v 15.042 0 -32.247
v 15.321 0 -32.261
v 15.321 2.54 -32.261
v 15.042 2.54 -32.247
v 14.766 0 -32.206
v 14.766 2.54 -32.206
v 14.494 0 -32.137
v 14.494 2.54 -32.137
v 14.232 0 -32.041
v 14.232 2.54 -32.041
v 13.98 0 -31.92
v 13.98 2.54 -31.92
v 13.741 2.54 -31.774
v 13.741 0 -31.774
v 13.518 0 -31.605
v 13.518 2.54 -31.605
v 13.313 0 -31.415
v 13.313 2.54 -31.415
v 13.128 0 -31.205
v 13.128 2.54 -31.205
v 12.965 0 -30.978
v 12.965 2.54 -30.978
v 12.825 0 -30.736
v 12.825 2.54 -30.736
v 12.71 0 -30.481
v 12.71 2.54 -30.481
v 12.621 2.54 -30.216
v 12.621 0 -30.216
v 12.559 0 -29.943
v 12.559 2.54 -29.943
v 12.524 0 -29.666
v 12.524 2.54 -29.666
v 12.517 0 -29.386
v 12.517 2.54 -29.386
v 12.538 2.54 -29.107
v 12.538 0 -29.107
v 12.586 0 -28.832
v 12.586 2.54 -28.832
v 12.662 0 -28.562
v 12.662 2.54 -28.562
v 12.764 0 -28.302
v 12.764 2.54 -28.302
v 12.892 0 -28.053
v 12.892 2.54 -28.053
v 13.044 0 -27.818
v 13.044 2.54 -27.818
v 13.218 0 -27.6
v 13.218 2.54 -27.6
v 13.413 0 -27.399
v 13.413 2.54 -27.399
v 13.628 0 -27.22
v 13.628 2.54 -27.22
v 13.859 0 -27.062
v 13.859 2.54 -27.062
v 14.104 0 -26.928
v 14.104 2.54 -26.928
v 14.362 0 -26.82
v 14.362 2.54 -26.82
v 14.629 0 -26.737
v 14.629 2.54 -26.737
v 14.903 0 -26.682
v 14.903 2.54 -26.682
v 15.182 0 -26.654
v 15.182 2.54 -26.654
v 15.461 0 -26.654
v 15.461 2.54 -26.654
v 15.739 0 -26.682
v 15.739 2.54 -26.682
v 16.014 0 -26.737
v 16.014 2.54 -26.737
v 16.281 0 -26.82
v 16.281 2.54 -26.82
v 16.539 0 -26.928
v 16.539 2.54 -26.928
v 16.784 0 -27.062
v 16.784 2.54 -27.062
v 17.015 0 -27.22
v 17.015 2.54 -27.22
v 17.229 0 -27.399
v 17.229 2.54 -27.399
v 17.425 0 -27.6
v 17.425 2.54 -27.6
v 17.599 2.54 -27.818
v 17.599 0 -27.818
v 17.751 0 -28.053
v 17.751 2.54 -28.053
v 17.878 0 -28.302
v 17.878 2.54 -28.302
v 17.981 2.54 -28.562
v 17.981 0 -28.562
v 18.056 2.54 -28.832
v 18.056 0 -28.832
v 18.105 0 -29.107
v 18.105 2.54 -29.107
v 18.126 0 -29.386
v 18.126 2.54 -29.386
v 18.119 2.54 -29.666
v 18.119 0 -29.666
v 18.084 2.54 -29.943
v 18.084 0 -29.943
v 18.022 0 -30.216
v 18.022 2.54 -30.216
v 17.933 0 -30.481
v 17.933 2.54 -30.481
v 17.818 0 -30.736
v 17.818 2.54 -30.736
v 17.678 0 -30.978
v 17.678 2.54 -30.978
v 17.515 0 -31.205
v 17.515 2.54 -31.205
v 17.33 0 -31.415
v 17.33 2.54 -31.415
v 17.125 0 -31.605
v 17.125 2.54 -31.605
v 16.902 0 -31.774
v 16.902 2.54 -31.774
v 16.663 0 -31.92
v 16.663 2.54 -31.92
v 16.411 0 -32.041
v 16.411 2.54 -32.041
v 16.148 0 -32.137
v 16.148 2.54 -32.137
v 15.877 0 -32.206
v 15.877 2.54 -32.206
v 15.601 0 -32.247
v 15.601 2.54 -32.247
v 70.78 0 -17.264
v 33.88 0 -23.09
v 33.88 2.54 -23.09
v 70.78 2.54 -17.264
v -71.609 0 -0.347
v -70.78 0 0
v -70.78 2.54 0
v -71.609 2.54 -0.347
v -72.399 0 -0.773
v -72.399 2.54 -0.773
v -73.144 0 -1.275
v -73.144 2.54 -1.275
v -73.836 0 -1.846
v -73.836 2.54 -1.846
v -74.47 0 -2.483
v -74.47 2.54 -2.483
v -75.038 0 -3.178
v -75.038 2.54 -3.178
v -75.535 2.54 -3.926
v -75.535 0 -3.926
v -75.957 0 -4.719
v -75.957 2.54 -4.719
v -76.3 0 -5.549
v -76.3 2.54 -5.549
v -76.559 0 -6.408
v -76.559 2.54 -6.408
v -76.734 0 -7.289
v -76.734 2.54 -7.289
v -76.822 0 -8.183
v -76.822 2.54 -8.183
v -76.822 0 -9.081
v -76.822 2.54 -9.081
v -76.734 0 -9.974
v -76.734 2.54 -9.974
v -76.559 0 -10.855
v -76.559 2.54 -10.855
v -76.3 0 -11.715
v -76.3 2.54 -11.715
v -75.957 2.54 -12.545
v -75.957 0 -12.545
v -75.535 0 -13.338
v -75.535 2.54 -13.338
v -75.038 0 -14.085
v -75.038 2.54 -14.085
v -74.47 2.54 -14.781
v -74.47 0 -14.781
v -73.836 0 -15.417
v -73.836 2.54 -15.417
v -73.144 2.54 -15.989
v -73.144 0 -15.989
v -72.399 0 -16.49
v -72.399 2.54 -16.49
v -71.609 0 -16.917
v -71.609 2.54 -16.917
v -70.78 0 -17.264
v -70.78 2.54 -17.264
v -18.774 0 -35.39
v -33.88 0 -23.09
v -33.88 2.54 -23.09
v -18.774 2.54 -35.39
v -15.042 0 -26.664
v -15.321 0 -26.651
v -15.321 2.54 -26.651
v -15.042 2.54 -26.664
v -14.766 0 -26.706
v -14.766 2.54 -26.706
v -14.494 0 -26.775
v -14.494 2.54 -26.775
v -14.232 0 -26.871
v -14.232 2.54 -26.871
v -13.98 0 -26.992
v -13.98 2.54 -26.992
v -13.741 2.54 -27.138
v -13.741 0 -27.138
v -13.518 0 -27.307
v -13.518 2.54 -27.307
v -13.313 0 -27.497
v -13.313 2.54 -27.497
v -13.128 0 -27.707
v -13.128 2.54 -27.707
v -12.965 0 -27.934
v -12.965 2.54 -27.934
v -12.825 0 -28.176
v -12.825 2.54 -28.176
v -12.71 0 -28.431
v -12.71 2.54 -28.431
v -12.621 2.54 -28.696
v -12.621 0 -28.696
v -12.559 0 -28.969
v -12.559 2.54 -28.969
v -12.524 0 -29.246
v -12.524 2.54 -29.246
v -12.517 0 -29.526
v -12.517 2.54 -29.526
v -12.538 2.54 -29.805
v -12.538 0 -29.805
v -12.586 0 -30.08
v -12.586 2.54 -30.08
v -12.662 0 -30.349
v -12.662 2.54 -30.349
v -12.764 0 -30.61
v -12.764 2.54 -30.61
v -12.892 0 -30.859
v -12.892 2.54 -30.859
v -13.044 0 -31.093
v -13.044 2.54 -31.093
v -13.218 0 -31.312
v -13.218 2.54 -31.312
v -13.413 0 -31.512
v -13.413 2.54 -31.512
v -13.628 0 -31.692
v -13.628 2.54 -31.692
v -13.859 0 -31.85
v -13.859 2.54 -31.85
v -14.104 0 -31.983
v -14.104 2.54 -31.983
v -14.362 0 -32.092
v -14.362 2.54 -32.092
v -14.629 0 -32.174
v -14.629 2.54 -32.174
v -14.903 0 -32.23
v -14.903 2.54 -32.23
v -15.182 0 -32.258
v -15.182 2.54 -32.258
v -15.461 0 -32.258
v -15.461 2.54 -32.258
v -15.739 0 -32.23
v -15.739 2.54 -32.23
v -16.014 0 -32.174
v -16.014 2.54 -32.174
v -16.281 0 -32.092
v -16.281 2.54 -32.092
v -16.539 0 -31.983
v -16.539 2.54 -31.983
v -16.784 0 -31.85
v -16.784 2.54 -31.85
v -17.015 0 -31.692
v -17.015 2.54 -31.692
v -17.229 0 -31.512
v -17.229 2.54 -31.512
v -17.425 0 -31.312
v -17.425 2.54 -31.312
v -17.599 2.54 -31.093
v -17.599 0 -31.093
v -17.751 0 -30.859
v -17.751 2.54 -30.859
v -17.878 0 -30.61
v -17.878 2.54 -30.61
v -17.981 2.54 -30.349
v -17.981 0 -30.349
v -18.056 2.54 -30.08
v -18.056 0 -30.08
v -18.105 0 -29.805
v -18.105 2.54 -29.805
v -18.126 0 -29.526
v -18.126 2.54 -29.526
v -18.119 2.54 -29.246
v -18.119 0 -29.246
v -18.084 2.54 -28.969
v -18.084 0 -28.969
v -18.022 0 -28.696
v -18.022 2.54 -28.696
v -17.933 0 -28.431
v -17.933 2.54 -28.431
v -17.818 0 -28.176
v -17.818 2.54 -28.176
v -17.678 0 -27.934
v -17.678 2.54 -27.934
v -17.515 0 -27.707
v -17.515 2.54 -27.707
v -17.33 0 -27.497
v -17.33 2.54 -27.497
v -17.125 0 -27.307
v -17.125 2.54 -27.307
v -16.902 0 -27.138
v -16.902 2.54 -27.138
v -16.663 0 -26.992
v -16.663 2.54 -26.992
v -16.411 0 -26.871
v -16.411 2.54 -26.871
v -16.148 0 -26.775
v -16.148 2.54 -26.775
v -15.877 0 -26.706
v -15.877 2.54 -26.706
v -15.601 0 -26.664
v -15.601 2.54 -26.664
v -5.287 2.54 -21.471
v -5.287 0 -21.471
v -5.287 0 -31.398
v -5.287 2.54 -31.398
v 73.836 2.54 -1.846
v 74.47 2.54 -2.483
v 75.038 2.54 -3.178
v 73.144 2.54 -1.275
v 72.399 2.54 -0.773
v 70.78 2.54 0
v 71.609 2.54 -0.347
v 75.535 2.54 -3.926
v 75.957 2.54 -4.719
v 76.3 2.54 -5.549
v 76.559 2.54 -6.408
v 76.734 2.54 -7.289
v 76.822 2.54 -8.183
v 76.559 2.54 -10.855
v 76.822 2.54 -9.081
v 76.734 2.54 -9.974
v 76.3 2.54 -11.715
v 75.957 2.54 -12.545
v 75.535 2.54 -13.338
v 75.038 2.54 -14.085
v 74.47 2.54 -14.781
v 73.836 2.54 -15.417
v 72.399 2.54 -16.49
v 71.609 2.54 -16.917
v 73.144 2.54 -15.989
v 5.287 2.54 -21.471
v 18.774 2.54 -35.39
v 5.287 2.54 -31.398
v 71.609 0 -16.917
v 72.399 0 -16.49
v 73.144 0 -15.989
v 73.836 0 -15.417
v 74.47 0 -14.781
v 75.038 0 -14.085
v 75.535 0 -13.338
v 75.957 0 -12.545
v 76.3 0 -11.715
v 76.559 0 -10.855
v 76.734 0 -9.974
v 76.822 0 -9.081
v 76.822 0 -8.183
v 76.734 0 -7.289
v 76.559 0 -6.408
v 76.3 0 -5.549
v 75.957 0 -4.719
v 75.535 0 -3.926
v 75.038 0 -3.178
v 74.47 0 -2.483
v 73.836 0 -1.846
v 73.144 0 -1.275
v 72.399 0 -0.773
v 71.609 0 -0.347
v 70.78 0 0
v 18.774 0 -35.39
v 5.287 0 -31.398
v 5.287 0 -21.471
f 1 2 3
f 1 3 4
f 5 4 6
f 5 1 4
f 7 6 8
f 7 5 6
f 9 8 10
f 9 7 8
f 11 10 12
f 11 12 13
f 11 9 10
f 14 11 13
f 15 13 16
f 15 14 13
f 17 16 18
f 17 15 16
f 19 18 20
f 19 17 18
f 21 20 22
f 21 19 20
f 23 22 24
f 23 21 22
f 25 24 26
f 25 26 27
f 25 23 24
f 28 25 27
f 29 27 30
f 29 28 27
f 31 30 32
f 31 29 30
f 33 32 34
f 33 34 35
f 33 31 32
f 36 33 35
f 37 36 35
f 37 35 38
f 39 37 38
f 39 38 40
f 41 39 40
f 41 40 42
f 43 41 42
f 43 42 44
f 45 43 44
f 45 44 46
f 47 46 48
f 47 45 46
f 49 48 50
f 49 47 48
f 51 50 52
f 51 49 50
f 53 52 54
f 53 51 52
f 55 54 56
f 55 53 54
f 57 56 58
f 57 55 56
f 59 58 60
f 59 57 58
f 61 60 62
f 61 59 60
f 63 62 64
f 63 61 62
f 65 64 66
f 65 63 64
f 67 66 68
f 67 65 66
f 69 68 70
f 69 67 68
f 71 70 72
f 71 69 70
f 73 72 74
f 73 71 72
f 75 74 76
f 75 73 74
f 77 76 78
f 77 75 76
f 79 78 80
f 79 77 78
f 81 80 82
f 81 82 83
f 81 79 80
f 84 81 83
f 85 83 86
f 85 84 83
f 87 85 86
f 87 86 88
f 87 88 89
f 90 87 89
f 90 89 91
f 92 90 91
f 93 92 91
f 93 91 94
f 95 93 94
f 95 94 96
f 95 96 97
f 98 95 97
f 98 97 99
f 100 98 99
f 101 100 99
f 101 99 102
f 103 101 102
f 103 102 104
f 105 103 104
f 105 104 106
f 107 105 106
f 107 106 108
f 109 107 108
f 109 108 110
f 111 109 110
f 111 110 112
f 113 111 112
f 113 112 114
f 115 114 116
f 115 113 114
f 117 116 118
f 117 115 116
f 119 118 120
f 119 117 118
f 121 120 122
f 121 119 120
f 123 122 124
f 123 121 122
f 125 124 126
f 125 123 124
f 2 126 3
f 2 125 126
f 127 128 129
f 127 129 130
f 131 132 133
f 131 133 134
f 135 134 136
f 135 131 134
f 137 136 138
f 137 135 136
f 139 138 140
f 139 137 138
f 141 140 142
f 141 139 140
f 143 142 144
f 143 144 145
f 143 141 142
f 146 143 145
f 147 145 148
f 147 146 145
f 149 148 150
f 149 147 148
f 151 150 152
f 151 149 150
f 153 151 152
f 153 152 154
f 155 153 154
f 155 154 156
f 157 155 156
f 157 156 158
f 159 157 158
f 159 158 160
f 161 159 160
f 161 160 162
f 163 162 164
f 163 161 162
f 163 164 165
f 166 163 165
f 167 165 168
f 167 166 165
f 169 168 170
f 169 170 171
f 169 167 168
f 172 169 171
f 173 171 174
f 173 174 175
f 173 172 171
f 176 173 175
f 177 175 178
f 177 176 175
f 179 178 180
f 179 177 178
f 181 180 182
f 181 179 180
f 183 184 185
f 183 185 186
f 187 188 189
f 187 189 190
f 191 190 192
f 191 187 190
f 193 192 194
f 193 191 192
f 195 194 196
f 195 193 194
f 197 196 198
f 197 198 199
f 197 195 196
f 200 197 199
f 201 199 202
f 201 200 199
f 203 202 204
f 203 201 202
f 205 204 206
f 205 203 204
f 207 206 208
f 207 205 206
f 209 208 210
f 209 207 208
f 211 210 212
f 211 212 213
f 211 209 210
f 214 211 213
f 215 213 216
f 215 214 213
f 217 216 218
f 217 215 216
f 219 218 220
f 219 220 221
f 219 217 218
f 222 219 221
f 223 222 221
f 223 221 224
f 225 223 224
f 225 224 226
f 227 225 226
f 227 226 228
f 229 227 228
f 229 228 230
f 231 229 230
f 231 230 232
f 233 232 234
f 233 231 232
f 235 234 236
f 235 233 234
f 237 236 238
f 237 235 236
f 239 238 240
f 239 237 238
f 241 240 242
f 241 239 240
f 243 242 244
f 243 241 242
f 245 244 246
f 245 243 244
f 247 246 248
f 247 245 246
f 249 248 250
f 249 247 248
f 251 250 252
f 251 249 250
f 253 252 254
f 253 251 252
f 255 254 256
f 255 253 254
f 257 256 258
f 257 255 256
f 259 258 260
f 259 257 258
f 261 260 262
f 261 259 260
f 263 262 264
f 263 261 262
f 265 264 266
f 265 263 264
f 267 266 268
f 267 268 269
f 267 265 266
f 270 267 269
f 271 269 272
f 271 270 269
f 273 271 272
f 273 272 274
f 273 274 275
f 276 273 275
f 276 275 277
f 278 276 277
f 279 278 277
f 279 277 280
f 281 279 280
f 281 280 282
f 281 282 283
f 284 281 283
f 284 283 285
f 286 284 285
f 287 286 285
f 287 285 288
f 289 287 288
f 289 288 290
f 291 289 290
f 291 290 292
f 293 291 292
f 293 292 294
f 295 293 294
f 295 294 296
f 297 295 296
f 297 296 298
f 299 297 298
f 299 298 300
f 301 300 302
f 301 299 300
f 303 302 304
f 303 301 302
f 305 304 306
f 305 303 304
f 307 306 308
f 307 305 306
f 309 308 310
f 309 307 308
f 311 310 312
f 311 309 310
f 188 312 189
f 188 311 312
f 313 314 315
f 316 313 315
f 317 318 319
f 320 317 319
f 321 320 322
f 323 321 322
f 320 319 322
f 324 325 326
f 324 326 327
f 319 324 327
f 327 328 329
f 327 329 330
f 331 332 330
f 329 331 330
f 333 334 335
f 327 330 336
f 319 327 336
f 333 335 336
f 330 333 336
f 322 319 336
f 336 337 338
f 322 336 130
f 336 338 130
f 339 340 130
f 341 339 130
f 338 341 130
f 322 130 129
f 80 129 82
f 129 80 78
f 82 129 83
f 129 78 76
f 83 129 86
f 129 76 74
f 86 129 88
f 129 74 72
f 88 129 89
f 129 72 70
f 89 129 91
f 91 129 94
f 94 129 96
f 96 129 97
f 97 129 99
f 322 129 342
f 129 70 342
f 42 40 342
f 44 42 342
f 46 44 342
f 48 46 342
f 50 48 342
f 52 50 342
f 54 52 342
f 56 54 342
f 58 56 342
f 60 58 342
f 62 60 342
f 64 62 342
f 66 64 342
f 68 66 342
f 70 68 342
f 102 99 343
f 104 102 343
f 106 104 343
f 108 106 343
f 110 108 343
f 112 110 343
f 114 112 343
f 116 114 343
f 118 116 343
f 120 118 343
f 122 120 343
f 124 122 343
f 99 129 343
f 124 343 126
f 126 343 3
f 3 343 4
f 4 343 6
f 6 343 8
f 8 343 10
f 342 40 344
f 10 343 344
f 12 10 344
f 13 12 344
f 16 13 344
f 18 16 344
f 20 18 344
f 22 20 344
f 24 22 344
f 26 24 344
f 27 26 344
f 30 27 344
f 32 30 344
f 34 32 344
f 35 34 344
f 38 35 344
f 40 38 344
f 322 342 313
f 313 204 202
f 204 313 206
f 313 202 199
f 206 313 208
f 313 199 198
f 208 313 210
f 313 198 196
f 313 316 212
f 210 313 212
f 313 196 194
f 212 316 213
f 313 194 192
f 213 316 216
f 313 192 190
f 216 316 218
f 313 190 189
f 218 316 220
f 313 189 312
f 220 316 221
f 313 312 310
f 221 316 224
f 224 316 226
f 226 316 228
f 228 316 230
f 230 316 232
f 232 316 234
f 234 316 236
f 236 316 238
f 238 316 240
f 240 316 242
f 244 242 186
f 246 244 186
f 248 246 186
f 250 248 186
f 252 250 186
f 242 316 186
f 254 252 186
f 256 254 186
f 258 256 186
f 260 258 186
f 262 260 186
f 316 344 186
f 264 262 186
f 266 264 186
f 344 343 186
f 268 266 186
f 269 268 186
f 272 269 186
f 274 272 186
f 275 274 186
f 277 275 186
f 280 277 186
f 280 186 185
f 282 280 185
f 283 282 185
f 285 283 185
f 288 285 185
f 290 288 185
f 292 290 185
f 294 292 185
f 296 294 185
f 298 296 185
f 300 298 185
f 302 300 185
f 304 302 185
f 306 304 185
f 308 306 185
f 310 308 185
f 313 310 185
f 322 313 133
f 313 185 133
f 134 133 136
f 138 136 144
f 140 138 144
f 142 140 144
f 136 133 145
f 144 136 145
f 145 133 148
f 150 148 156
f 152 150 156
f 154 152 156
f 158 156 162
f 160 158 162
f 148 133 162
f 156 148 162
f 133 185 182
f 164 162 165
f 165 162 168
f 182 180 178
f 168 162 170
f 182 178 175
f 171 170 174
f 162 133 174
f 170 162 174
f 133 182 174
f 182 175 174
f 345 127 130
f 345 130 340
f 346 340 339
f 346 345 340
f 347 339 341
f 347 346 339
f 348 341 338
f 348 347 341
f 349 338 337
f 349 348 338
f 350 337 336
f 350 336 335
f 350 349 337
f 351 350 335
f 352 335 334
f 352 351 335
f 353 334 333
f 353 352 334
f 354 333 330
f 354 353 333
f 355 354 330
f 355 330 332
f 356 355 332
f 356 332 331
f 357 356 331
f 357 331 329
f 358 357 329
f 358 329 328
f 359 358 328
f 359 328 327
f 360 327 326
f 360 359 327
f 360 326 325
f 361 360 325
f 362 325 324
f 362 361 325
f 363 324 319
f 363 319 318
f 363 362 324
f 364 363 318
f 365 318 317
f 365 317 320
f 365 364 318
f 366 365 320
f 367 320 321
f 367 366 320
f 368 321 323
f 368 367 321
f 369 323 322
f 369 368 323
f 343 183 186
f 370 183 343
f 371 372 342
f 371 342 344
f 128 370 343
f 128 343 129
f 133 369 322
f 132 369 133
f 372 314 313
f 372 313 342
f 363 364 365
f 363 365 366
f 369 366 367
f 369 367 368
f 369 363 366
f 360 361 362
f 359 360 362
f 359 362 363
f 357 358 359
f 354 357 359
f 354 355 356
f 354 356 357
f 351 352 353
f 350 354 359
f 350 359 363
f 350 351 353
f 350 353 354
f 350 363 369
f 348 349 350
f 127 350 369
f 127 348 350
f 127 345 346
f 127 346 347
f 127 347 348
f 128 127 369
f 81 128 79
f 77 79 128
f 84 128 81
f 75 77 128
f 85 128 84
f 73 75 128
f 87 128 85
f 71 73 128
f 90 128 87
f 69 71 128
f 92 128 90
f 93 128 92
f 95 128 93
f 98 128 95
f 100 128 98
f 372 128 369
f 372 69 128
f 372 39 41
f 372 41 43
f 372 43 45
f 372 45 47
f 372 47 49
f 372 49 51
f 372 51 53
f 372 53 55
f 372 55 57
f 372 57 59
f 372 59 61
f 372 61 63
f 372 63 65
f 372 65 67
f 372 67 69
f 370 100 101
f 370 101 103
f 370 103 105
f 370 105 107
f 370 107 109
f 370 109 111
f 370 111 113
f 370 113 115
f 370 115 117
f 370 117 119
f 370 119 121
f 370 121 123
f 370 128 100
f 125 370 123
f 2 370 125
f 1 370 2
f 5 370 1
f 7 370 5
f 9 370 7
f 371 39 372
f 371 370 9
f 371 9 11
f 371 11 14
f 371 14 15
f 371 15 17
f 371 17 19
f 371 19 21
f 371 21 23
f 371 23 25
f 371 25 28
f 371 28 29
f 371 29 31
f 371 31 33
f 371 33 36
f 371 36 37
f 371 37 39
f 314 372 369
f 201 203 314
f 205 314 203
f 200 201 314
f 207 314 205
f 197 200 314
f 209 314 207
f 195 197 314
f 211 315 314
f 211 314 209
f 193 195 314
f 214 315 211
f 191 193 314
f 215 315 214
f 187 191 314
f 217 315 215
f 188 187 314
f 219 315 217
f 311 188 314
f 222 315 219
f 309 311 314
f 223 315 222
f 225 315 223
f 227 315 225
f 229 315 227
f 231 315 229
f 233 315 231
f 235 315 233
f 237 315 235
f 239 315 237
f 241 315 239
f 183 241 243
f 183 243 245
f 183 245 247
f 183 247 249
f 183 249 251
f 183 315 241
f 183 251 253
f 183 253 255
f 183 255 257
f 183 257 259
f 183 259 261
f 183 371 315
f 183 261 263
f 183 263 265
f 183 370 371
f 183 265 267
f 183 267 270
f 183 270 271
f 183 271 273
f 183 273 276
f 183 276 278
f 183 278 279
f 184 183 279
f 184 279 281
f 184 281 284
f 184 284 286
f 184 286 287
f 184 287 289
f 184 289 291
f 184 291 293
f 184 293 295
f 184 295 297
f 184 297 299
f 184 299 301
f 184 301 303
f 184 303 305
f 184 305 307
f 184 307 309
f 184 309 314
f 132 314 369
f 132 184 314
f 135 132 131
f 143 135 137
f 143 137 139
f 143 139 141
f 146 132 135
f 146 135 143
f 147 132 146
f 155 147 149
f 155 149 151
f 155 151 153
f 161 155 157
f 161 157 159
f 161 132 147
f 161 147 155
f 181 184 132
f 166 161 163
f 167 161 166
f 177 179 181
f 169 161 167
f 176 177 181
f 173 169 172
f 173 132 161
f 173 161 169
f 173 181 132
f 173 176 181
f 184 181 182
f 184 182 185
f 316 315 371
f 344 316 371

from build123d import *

# Parameters (mm, degrees)
SKETCH1_R           = 2.805320717
SKETCH1_W           = 10.573901166
SKETCH1_H           = 9.926519461
BOSS_EXTRUDE1_DEPTH = 2.54


with BuildPart() as part:
    # Sketch1 → Boss-Extrude1 (new body)
    with BuildSketch(Plane(origin=(0, 0, 0), x_dir=(1, 0, 0), z_dir=(0, 1, 0))):
        with BuildLine():
            Line((70.780399637, 0), (-70.780399637, 0))
            ThreePointArc((-70.780399637, 0), (-76.832778265, 8.631756053), (-70.780399637, 17.263512107))
            Line((-70.780399637, 17.263512107), (-33.879642509, 23.089947443))
            Line((-33.879642509, 23.089947443), (-18.774069416, 35.390199818))
            Line((-18.774069416, 35.390199818), (18.774069416, 35.390199818))
            Line((18.774069416, 35.390199818), (33.879642509, 23.089947443))
            Line((33.879642509, 23.089947443), (70.780399637, 17.263512107))
            ThreePointArc((70.780399637, 17.263512107), (76.832778265, 8.631756053), (70.780399637, 0))
        make_face()
        with Locations(Location((-15.321366995, 29.455867532, 0), (0, 0, 270))):
            Circle(SKETCH1_R, mode=Mode.SUBTRACT)
        with Locations(Location((15.321366995, 29.455867532, 0), (0, 0, 90))):
            Circle(SKETCH1_R, mode=Mode.SUBTRACT)
        with Locations((0, 26.434752913)):
            Rectangle(SKETCH1_W, SKETCH1_H, mode=Mode.SUBTRACT)
    extrude(amount=BOSS_EXTRUDE1_DEPTH)


solid = part.part
